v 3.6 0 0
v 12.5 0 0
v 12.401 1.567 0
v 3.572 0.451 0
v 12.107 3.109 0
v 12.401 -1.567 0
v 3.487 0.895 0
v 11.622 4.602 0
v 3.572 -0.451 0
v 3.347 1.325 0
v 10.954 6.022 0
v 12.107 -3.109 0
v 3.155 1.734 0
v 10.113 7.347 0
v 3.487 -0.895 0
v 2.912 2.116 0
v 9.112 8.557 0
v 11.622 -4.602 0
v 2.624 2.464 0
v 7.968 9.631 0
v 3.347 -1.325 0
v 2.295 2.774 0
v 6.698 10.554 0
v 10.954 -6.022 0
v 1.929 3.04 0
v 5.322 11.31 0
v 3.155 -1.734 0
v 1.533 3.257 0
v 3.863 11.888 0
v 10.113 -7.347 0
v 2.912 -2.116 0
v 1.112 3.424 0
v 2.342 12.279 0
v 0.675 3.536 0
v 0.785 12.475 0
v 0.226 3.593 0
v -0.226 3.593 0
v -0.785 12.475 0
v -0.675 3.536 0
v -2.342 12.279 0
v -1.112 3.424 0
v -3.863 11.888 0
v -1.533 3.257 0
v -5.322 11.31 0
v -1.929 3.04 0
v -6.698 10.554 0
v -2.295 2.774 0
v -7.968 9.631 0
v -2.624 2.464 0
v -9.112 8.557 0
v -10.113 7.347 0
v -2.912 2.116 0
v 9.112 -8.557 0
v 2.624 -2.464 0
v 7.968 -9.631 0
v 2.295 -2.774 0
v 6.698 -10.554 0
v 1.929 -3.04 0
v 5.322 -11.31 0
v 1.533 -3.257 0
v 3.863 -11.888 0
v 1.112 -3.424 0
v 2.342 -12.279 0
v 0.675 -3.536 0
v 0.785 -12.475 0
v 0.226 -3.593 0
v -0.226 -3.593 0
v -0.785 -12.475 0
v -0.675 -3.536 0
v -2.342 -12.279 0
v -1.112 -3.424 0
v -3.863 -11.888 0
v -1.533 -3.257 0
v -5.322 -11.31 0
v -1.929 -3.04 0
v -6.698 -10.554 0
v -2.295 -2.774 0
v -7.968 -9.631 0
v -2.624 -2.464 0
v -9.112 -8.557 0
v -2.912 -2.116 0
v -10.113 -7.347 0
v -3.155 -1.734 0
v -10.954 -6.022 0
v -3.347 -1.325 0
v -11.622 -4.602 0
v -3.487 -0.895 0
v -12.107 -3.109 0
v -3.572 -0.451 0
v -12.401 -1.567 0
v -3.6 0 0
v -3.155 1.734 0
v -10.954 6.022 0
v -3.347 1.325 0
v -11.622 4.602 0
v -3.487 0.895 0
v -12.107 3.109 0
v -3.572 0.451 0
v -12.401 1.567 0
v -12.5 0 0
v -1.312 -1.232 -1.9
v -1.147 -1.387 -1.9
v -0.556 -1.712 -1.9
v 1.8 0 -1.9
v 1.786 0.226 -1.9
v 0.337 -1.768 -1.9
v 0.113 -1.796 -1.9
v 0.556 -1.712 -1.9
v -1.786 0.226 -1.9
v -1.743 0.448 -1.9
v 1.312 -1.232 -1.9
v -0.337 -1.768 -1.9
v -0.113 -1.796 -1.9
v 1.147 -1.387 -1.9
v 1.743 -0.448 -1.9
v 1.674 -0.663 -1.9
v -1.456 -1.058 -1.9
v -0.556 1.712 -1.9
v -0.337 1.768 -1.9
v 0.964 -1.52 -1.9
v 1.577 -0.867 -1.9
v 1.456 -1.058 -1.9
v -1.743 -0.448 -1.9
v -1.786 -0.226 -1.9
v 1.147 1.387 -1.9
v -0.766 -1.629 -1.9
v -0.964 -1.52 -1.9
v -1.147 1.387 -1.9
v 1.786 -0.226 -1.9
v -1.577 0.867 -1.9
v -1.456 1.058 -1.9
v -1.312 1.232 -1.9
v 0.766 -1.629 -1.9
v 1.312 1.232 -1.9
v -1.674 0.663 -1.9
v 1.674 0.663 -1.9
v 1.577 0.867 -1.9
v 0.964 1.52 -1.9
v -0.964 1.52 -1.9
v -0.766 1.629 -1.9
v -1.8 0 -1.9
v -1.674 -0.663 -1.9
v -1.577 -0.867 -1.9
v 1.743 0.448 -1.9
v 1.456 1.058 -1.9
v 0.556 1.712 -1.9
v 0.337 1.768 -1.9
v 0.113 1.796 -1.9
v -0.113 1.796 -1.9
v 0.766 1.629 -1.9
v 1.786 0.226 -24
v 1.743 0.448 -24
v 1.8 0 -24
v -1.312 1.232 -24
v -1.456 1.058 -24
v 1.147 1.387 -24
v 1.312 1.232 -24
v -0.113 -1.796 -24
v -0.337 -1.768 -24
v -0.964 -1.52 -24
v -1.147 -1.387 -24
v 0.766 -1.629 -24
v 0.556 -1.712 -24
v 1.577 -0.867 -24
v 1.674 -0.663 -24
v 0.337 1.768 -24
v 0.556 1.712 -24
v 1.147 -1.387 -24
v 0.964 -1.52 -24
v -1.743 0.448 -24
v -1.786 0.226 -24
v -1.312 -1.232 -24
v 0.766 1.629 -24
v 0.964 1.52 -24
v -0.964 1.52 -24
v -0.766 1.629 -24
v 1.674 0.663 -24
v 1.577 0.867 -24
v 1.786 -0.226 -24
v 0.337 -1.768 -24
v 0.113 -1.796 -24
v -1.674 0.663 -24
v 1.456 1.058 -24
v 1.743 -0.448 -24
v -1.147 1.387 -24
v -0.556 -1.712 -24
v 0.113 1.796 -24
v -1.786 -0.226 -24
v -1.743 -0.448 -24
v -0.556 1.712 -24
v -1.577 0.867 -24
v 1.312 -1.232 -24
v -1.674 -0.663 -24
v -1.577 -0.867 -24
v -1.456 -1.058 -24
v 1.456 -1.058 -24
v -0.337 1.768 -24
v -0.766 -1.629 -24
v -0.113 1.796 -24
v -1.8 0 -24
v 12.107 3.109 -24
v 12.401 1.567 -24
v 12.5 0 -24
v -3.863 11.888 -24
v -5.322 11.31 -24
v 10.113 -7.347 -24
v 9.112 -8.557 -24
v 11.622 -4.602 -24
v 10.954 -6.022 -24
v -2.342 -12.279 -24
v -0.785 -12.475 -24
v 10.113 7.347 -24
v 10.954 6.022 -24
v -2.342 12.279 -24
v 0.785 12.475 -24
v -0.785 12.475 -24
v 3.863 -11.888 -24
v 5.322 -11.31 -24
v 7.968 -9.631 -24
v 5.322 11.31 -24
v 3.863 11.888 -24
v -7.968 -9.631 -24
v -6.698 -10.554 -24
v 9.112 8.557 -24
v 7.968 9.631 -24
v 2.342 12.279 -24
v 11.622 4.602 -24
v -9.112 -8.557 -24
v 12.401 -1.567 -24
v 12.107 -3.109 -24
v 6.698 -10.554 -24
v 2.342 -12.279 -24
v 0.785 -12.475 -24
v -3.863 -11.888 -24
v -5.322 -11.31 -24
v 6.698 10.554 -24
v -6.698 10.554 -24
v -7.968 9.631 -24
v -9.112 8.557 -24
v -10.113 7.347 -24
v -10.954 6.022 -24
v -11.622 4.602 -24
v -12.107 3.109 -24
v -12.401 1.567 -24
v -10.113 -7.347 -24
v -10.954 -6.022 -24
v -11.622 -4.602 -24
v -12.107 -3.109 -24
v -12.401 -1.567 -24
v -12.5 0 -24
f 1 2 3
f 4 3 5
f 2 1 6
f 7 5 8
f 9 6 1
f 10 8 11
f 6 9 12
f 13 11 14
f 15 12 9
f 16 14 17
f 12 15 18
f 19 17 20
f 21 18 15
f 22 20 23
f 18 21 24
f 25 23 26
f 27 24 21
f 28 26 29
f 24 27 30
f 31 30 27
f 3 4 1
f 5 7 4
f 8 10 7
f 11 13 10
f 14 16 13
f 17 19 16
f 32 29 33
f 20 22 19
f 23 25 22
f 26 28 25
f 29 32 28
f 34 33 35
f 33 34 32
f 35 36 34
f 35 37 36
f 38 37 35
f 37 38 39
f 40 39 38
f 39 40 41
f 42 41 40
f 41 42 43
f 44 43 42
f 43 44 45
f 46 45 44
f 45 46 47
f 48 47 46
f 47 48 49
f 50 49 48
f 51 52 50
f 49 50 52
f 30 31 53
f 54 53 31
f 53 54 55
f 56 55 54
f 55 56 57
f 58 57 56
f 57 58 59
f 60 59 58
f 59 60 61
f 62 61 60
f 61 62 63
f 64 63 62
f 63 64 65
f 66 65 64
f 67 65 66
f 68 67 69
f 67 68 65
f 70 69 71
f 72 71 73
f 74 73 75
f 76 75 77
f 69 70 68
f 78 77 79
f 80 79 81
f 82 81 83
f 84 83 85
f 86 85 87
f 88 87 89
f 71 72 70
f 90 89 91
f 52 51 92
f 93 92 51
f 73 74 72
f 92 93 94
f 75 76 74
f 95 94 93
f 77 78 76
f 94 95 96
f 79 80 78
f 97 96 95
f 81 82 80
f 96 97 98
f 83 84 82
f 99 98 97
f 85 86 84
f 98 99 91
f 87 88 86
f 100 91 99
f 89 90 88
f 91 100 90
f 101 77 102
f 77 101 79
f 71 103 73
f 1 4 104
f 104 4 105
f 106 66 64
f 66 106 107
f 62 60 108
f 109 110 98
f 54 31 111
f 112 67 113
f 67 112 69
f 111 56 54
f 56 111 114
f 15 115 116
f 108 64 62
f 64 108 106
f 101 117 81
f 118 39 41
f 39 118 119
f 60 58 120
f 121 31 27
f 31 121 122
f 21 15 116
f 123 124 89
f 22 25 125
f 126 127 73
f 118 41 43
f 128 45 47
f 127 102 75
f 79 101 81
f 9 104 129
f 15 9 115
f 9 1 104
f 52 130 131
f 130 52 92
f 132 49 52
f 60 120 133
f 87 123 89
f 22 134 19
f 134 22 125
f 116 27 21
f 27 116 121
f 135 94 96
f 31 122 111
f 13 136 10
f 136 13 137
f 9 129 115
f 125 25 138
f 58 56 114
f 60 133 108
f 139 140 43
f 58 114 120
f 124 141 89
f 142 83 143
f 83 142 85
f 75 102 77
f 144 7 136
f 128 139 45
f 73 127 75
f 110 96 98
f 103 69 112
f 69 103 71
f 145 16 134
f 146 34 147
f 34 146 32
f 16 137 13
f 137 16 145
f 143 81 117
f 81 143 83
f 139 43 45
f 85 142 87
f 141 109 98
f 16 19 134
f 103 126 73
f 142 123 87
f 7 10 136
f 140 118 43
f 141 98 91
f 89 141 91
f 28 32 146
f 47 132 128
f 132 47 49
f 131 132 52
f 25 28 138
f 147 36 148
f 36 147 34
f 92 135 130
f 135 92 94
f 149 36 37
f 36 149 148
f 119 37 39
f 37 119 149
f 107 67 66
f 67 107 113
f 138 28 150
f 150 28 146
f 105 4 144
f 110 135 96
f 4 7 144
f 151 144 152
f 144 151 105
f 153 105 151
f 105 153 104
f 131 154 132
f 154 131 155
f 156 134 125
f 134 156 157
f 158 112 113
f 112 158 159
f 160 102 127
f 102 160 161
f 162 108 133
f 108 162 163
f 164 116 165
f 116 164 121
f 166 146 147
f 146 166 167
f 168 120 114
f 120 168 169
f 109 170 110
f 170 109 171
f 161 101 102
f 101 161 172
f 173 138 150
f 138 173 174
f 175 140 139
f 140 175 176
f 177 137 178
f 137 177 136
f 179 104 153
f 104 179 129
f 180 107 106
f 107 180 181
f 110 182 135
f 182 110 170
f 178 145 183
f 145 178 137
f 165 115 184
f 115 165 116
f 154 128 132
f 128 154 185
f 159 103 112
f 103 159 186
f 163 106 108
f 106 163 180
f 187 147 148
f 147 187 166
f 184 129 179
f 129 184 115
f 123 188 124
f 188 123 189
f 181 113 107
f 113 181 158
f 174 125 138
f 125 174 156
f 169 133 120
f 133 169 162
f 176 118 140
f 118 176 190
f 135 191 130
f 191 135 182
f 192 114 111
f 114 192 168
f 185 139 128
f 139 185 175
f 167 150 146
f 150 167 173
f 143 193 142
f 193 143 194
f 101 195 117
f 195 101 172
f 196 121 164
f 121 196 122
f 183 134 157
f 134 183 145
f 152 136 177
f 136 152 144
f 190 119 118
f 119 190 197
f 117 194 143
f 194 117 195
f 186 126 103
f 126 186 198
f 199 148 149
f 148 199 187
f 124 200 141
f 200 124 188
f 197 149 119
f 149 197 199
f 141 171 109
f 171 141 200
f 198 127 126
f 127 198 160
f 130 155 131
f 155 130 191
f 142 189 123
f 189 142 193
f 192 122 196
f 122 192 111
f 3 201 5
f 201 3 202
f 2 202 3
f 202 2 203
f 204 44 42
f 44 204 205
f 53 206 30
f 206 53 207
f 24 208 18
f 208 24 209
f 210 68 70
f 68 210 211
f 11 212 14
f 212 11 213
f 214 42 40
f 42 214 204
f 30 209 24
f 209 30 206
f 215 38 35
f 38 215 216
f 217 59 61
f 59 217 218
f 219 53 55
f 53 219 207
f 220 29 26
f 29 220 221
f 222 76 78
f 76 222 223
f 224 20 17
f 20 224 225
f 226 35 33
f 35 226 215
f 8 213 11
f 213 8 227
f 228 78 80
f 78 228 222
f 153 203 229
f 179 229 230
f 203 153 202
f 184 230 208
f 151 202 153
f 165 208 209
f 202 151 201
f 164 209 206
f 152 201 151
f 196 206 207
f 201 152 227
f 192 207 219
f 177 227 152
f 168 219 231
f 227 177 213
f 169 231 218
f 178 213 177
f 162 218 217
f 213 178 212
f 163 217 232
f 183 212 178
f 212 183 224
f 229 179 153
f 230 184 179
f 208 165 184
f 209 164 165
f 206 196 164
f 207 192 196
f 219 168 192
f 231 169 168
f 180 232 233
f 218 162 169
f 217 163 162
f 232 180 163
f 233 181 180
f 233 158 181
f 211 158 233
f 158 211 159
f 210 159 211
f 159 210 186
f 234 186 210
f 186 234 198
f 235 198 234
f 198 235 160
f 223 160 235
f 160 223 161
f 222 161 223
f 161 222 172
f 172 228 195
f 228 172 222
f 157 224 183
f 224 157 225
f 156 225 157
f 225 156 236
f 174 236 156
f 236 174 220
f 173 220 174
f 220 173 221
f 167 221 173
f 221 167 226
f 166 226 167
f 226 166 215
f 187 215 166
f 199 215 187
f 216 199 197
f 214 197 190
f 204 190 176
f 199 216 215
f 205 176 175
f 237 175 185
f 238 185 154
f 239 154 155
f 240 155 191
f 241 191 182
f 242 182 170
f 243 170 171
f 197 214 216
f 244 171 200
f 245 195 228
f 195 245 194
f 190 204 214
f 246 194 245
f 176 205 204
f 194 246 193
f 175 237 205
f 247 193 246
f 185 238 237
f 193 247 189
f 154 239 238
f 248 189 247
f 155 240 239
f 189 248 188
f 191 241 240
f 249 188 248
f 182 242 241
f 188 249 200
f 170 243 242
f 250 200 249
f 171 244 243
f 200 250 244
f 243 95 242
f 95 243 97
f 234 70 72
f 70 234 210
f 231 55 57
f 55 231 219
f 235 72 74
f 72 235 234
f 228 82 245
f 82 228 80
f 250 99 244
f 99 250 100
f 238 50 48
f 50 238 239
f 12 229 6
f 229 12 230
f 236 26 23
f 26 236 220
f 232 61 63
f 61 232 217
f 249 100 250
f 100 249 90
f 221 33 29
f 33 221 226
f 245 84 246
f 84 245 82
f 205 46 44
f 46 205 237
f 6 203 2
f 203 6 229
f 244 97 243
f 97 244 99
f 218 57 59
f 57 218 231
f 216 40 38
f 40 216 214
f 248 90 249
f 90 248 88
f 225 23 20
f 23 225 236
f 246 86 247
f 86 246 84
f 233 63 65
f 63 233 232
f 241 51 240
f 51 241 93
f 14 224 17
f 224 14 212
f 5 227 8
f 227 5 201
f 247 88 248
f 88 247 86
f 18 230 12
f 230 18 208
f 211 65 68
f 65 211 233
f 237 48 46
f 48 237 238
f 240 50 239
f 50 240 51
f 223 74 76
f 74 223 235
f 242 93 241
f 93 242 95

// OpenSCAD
$fn = 50;

difference() {
	union() {
		translate(v = [0, 0, -24.0]) {
			cylinder(h = 24, r = 12.5);
		}
	}
	union() {
		translate(v = [0, 0, 0]) {
			rotate(a = [0, 0, 0]) {
				difference() {
					union() {
						translate(v = [0, 0, -27.0]) {
							cylinder(h = 27, r = 1.5);
						}
						translate(v = [0, 0, -1.9]) {
							cylinder(h = 1.9, r1 = 1.8, r2 = 3.6);
						}
						translate(v = [0, 0, -27.0]) {
							cylinder(h = 27, r = 1.8);
						}
						translate(v = [0, 0, -27.0]) {
							cylinder(h = 27, r = 1.5);
						}
					}
					union();
				}
			}
		}
	}
}
